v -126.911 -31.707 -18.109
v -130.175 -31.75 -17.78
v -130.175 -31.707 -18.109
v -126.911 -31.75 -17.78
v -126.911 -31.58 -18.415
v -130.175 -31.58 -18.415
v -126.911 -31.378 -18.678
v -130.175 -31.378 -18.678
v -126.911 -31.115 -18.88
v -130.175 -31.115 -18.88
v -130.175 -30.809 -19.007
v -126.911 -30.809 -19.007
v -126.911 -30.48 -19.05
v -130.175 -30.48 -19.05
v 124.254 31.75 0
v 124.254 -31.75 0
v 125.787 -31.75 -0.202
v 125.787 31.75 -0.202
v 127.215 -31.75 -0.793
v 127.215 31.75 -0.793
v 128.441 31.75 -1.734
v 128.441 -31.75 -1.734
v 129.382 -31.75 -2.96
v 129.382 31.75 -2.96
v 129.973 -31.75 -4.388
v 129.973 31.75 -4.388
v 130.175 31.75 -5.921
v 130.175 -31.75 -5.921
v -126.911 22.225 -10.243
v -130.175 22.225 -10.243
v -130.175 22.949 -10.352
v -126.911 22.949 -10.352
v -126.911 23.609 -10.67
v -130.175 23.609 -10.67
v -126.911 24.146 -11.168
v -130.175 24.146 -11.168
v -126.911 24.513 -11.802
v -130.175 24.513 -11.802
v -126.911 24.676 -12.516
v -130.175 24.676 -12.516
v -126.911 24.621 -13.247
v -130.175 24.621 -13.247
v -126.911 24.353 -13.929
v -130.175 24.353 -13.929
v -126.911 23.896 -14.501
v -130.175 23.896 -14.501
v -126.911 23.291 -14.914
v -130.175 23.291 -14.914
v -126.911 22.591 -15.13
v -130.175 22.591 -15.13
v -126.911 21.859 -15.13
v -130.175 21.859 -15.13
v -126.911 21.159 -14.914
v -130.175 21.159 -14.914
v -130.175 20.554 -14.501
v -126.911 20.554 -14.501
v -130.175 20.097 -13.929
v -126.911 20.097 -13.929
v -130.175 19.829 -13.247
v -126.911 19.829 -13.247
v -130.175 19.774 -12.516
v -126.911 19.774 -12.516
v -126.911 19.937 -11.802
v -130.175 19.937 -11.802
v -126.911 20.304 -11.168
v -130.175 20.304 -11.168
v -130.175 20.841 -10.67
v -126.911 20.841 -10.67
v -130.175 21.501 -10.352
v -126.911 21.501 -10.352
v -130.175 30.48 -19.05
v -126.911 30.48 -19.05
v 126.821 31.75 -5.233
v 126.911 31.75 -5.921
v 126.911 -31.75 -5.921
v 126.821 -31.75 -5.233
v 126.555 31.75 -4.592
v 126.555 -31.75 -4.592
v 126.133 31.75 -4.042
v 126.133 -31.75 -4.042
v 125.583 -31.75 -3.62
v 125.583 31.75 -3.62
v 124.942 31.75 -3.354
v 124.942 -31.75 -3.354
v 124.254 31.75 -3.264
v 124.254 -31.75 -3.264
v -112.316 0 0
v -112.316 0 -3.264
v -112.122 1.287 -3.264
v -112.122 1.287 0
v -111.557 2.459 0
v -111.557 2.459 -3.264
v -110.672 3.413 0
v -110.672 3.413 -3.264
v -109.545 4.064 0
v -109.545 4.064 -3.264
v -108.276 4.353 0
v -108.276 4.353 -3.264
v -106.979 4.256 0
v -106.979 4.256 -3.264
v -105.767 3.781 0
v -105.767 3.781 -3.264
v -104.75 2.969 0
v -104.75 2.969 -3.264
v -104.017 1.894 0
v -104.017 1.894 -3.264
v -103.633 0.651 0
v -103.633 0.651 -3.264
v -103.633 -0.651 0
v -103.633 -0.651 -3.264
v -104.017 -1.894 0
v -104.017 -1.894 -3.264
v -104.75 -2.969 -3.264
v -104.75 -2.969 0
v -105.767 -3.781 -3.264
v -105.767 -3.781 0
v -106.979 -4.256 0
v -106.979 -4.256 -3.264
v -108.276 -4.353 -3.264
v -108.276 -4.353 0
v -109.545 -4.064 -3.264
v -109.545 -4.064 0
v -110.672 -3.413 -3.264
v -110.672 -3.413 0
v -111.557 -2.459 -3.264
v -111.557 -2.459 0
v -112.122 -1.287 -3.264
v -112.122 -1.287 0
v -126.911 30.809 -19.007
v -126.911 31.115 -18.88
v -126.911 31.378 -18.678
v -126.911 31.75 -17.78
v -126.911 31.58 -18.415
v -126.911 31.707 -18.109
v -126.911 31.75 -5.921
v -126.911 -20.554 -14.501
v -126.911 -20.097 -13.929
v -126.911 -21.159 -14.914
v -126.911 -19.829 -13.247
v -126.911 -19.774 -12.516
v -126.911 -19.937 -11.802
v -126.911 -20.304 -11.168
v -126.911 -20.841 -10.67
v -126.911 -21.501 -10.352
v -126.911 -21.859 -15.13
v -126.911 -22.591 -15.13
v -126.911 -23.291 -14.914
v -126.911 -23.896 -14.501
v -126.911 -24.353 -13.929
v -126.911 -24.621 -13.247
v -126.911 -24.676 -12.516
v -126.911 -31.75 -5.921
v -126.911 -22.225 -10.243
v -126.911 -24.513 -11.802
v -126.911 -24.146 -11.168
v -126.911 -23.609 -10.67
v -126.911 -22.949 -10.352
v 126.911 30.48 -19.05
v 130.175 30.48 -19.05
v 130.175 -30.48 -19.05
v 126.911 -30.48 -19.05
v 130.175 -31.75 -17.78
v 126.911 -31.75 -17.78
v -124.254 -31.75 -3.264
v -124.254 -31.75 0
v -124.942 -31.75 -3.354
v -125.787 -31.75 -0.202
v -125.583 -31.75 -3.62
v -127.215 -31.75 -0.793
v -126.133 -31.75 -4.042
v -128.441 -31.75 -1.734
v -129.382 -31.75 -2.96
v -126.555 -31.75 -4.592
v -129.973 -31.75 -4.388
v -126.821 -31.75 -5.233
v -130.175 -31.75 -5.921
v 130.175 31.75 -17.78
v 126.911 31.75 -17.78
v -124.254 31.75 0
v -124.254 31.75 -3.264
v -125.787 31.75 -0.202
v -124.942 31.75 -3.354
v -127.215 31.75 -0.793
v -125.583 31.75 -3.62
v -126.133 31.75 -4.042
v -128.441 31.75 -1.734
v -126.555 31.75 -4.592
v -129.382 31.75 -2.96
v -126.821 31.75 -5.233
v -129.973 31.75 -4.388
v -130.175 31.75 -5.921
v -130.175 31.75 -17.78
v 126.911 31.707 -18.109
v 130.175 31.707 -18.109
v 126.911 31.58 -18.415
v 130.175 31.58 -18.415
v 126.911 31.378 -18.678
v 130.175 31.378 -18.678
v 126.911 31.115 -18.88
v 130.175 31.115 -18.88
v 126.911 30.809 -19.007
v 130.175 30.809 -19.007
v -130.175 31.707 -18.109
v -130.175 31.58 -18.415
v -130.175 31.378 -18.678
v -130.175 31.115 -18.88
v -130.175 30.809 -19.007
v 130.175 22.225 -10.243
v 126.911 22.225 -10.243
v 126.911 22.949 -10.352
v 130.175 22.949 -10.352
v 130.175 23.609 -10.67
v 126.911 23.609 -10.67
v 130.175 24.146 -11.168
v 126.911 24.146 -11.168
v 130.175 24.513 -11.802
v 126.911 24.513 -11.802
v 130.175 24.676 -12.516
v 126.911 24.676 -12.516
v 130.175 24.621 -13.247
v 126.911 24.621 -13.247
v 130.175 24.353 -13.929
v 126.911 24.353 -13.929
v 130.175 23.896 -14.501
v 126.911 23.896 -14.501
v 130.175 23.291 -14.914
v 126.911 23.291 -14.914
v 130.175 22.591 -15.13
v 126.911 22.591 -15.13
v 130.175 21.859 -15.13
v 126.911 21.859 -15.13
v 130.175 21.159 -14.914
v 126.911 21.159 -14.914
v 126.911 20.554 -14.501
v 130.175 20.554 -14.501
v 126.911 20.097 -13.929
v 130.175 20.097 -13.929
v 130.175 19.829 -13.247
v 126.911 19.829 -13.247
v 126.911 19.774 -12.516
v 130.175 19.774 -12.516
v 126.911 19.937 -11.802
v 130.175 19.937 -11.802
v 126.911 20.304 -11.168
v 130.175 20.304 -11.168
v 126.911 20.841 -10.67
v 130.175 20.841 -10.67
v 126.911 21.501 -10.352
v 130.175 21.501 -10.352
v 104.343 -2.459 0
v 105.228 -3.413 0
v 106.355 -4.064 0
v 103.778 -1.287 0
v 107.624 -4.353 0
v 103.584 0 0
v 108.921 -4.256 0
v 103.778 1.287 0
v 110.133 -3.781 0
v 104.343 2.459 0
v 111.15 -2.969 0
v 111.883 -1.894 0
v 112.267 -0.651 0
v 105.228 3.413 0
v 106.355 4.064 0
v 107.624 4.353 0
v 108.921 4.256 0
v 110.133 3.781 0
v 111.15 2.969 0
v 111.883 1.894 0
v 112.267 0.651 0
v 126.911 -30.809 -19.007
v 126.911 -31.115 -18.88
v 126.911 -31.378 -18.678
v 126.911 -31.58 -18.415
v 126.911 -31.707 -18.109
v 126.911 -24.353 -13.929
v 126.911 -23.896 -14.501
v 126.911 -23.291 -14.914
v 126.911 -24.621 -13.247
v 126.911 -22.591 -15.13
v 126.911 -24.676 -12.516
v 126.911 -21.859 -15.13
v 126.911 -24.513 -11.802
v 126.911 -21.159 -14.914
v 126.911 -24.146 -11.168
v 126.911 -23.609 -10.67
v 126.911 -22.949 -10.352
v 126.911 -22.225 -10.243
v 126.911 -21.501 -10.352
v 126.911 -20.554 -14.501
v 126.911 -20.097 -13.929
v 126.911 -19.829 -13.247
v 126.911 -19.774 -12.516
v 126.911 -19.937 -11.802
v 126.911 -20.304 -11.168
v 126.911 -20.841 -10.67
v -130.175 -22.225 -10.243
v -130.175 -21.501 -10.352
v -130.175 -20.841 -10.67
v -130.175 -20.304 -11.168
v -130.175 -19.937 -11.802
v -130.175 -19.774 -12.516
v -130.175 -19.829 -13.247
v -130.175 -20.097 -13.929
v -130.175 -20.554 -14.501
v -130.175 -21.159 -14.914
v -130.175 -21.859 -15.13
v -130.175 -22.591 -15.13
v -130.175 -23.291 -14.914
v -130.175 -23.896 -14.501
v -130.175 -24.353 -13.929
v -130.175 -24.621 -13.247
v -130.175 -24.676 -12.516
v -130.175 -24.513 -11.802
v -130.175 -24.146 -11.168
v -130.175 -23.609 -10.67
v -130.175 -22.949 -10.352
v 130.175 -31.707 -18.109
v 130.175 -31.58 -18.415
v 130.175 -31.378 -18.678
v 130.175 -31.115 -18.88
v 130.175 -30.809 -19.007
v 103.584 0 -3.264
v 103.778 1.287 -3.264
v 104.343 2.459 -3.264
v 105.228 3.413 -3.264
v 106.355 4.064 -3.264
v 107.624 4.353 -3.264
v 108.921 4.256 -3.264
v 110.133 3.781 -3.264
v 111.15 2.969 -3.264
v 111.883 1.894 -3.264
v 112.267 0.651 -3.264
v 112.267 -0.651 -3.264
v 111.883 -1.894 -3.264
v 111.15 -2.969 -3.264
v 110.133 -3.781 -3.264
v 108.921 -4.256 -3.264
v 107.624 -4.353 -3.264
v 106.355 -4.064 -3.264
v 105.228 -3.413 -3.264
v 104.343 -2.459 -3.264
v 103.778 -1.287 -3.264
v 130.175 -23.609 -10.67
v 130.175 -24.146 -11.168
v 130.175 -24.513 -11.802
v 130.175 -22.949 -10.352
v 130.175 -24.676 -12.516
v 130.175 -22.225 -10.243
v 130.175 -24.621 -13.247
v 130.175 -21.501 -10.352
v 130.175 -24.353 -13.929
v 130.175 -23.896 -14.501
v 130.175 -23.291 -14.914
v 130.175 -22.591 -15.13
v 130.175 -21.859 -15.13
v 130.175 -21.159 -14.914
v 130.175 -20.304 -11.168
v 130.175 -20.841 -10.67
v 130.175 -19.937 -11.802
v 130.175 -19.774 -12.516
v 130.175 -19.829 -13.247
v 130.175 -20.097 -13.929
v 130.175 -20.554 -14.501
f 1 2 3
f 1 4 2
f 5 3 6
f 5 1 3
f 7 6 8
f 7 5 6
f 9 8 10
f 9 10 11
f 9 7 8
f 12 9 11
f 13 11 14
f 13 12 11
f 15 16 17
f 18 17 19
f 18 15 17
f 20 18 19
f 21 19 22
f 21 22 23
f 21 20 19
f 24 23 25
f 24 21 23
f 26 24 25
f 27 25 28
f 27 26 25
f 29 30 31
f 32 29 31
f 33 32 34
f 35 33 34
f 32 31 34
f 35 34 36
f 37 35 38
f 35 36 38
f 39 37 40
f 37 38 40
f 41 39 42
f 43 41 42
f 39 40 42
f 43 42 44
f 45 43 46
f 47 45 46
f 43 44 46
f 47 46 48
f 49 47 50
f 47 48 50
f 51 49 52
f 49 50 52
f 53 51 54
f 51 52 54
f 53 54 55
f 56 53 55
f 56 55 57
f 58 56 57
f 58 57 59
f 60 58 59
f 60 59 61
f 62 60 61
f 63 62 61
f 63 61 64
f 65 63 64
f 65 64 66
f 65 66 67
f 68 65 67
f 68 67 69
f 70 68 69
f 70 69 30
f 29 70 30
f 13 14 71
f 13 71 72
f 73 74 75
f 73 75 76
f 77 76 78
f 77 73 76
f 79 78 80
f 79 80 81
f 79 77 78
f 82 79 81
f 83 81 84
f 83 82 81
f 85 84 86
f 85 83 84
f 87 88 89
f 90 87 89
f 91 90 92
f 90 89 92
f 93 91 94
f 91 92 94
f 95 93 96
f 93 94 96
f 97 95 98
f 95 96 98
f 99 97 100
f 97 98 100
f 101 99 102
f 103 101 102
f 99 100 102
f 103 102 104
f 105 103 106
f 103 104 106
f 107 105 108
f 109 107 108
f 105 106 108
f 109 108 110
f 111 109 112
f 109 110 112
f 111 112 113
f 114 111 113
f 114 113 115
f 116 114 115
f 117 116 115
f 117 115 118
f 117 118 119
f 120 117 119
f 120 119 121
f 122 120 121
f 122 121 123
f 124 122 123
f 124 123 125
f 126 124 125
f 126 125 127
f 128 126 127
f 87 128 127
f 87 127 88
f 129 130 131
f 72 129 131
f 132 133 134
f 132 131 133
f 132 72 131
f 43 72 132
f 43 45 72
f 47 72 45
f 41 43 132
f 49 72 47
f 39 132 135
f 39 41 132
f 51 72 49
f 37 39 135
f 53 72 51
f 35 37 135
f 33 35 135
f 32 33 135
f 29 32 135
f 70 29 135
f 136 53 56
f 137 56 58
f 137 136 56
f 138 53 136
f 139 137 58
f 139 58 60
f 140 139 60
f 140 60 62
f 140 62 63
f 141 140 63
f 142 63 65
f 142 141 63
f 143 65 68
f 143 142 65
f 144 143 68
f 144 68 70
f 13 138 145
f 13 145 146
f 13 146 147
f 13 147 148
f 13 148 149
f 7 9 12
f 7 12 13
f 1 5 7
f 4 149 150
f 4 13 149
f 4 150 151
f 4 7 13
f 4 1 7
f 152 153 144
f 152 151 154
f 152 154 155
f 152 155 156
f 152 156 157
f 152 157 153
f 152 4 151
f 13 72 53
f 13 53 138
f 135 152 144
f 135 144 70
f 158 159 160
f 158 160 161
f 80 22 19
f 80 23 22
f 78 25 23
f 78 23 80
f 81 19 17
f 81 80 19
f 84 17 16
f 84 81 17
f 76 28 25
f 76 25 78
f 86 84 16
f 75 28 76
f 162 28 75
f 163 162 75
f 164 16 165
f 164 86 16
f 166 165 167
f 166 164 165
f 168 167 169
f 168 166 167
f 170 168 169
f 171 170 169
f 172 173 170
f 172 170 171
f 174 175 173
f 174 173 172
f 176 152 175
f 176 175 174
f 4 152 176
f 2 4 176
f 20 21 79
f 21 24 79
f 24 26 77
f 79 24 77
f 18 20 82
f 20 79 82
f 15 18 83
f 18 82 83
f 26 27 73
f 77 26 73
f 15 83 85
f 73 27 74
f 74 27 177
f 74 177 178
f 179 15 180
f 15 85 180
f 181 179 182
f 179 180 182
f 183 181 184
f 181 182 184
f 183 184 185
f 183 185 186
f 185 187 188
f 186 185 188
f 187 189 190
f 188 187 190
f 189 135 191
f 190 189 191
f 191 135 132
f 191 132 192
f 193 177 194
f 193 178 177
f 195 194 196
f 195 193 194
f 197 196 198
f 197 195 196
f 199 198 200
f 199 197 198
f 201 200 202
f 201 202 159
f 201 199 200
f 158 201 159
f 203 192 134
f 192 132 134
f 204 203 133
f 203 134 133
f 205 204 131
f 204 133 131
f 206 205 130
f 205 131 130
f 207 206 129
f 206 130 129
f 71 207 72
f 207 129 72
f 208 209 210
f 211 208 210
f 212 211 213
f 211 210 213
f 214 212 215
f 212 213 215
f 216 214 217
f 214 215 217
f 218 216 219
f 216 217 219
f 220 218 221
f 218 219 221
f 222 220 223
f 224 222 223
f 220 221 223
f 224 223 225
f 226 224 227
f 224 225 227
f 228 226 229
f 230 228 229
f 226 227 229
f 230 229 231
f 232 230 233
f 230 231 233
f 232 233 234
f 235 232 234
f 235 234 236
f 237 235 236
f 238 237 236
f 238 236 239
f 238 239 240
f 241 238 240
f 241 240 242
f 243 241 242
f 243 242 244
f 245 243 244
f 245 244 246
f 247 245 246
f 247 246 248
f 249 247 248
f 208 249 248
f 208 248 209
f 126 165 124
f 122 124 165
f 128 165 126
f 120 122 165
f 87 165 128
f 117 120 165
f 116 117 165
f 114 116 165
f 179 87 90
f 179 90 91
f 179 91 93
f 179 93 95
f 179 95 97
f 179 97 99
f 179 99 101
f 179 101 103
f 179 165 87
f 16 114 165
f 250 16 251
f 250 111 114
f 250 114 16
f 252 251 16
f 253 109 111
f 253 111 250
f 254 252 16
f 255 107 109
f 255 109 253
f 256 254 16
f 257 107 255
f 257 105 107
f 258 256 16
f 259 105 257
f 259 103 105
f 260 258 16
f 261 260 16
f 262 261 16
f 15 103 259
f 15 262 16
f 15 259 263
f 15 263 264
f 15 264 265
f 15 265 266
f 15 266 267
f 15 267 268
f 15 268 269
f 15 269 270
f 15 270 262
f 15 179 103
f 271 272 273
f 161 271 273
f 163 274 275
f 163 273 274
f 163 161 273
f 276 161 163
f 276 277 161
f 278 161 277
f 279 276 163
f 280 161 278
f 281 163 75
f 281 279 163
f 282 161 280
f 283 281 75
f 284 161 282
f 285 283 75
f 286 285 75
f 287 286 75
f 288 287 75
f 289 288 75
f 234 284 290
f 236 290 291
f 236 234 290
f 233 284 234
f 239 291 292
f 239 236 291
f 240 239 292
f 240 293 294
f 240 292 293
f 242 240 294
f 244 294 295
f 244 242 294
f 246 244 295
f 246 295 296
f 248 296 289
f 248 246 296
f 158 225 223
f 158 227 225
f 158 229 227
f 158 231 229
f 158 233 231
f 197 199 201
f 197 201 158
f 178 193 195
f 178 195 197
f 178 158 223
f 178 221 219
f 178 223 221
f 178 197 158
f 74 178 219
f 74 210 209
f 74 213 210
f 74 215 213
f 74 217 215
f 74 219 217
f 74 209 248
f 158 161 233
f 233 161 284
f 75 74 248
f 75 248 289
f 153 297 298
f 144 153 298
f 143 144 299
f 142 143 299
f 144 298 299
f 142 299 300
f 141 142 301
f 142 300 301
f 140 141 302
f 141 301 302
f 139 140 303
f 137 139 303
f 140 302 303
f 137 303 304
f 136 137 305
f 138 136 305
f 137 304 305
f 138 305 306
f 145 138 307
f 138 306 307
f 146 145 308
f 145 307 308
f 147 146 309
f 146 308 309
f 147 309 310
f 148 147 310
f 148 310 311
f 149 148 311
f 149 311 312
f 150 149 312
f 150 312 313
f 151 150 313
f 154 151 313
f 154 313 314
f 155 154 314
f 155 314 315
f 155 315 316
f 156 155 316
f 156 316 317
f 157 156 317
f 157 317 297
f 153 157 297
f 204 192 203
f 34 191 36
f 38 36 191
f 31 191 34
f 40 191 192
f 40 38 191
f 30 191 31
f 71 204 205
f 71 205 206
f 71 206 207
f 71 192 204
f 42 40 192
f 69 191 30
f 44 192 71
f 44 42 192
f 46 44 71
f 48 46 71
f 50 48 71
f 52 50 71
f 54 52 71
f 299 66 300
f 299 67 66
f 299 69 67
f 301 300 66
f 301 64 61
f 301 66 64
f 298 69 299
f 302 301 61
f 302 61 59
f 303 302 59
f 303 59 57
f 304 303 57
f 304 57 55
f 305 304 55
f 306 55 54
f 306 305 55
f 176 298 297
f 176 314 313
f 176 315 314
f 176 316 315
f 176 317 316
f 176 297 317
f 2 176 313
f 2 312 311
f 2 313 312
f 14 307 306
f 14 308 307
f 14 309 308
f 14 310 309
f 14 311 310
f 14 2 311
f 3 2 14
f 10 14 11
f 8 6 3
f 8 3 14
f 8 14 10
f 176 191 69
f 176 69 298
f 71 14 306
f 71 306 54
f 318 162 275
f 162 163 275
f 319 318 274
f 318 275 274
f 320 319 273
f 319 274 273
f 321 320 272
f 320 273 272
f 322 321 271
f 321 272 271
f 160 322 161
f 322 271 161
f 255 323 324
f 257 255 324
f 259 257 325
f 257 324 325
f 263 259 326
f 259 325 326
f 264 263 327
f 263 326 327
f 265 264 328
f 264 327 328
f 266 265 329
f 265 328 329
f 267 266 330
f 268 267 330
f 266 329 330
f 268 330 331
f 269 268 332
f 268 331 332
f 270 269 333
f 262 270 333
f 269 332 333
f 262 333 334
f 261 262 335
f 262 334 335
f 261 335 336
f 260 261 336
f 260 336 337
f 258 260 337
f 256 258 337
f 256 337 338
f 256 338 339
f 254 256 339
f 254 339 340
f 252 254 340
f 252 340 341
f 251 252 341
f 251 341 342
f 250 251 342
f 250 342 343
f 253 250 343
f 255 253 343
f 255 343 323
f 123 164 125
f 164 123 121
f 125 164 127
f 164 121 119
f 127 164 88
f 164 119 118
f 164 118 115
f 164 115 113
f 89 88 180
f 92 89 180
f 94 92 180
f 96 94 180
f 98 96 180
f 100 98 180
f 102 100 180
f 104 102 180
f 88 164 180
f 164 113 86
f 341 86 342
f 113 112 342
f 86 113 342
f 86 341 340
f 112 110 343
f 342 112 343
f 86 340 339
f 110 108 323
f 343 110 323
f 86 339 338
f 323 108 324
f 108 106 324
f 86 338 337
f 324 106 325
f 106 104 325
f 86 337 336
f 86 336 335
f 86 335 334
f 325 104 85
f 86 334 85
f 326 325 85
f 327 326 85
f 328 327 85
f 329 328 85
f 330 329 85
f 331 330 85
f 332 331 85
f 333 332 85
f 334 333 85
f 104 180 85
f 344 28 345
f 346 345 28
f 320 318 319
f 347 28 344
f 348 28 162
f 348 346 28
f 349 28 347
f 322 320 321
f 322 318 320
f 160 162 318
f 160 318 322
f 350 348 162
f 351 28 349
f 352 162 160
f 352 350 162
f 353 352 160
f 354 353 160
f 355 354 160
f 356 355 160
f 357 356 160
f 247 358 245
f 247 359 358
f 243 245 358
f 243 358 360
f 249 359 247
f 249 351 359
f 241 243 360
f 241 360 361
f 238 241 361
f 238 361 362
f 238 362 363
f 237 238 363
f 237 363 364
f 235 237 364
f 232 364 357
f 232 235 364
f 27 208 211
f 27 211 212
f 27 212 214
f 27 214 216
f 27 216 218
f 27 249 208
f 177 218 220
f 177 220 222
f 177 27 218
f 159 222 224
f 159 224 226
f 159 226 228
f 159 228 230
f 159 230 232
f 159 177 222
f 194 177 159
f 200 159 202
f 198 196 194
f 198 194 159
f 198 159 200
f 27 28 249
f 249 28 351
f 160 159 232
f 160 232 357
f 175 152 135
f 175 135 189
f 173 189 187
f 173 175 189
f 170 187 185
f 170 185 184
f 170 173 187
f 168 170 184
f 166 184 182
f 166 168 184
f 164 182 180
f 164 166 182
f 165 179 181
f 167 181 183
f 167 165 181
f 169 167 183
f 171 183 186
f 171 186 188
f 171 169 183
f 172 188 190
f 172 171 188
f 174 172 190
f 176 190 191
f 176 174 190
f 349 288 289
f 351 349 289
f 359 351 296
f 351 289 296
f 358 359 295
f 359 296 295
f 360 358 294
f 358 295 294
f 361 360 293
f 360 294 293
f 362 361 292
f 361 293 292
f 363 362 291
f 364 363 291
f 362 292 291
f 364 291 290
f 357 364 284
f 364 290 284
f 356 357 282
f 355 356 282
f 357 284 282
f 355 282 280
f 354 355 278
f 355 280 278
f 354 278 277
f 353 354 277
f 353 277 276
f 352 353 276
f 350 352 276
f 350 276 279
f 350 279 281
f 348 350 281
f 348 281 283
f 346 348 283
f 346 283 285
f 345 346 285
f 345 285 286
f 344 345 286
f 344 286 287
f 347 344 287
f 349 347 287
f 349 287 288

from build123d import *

# Parameters (mm, degrees)
SKETCH1_W                        = 260.35
SKETCH1_H                        = 63.5
BASE_FLANGE1_DEPTH               = 3.2639
EDGE_FLANGE1_STRIP_W             = 18.36928
EDGE_FLANGE1_STRIP_H             = 3.2639
EDGE_FLANGE1_STRIP_CUT_DEPTH     = 63.5
EDGE_FLANGE1_STRIP_2_W           = 18.36928
EDGE_FLANGE1_STRIP_2_H           = 3.2639
EDGE_FLANGE1_STRIP_CUT_2_DEPTH   = 63.5
EDGE_FLANGE1_DEPTH               = 63.5
EDGE_FLANGE1_BEND_DEPTH          = 63.5
F_10_0_1935_DIAMETER_HOLE1_D     = 4.9149
FILLET1_R                        = 1.27
F_11_32_0_34375_DIAMETER_HOLE1_D = 8.73125


# Sheet-metal steps are written as plain solids
with BuildPart() as part:
    # Sketch1 → Base-Flange1 (new body)
    with BuildSketch(Plane.XY):
        Rectangle(SKETCH1_W, SKETCH1_H)
    extrude(amount=-BASE_FLANGE1_DEPTH)

    # Edge-Flange1 strip (across the edge) → Edge-Flange1 strip cut (cut)
    with BuildSketch(Plane(origin=(130.175, 31.75, -3.2639), x_dir=(-1, 0, 0), z_dir=(0, -1, 0))):
        with Locations((-3.2639, -1.63195)):
            Rectangle(EDGE_FLANGE1_STRIP_W, EDGE_FLANGE1_STRIP_H)
    extrude(amount=EDGE_FLANGE1_STRIP_CUT_DEPTH, mode=Mode.SUBTRACT)

    # Edge-Flange1 strip 2 (across the edge) → Edge-Flange1 strip cut 2 (cut)
    with BuildSketch(Plane(origin=(-130.175, -31.75, -3.2639), x_dir=(1, 0, 0), z_dir=(0, 1, 0))):
        with Locations((-3.2639, -1.63195)):
            Rectangle(EDGE_FLANGE1_STRIP_2_W, EDGE_FLANGE1_STRIP_2_H)
    extrude(amount=EDGE_FLANGE1_STRIP_CUT_2_DEPTH, mode=Mode.SUBTRACT)

    # Edge-Flange1 section (across the edge) → Edge-Flange1 (add)
    with BuildSketch(Plane(origin=(130.175, 31.75, -3.2639), x_dir=(-1, 0, 0), z_dir=(0, -1, 0))):
        with BuildLine():
            Line((0, 2.65684), (0, 15.7861))
            Line((0, 15.7861), (3.2639, 15.7861))
            Line((3.2639, 15.7861), (3.2639, 2.65684))
            ThreePointArc((3.2639, 2.65684), (4.042070419, 0.778170419), (5.92074, 0))
            Line((5.92074, 0), (5.92074, -3.2639))
            ThreePointArc((5.92074, -3.2639), (1.734144596, -1.529755404), (0, 2.65684))
        make_face()
    extrude(amount=EDGE_FLANGE1_DEPTH)

    # Edge-Flange1 section 2 (across the edge) → Edge-Flange1 bend (add)
    with BuildSketch(Plane(origin=(-130.175, -31.75, -3.2639), x_dir=(1, 0, 0), z_dir=(0, 1, 0))):
        with BuildLine():
            Line((0, 2.65684), (0, 15.7861))
            Line((0, 15.7861), (3.2639, 15.7861))
            Line((3.2639, 15.7861), (3.2639, 2.65684))
            ThreePointArc((3.2639, 2.65684), (4.042070419, 0.778170419), (5.92074, 0))
            Line((5.92074, 0), (5.92074, -3.2639))
            ThreePointArc((5.92074, -3.2639), (1.734144596, -1.529755404), (0, 2.65684))
        make_face()
    extrude(amount=EDGE_FLANGE1_BEND_DEPTH)

    # #10 (0.1935) Diameter Hole1 (through all)
    with Locations(Plane(origin=(130.175, 0, 0), x_dir=(0, 0, -1), z_dir=(1, 0, 0))):
        with Locations((12.7, 22.225), (12.7, -22.225)):
            Hole(F_10_0_1935_DIAMETER_HOLE1_D / 2)

    # Fillet1
    fillet1_edges = [part.edges().sort_by_distance(p)[0] for p in [
        (128.54305, 31.75, -19.05),
        (128.54305, -31.75, -19.05),
        (-128.54305, -31.75, -19.05),
        (-128.54305, 31.75, -19.05),
    ]]
    fillet(fillet1_edges, radius=FILLET1_R)

    # 11/32 (0.34375) Diameter Hole1 (through all)
    with Locations(Plane.XY):
        with Locations((-107.95, 0), (107.95, 0)):
            Hole(F_11_32_0_34375_DIAMETER_HOLE1_D / 2)


solid = part.part
